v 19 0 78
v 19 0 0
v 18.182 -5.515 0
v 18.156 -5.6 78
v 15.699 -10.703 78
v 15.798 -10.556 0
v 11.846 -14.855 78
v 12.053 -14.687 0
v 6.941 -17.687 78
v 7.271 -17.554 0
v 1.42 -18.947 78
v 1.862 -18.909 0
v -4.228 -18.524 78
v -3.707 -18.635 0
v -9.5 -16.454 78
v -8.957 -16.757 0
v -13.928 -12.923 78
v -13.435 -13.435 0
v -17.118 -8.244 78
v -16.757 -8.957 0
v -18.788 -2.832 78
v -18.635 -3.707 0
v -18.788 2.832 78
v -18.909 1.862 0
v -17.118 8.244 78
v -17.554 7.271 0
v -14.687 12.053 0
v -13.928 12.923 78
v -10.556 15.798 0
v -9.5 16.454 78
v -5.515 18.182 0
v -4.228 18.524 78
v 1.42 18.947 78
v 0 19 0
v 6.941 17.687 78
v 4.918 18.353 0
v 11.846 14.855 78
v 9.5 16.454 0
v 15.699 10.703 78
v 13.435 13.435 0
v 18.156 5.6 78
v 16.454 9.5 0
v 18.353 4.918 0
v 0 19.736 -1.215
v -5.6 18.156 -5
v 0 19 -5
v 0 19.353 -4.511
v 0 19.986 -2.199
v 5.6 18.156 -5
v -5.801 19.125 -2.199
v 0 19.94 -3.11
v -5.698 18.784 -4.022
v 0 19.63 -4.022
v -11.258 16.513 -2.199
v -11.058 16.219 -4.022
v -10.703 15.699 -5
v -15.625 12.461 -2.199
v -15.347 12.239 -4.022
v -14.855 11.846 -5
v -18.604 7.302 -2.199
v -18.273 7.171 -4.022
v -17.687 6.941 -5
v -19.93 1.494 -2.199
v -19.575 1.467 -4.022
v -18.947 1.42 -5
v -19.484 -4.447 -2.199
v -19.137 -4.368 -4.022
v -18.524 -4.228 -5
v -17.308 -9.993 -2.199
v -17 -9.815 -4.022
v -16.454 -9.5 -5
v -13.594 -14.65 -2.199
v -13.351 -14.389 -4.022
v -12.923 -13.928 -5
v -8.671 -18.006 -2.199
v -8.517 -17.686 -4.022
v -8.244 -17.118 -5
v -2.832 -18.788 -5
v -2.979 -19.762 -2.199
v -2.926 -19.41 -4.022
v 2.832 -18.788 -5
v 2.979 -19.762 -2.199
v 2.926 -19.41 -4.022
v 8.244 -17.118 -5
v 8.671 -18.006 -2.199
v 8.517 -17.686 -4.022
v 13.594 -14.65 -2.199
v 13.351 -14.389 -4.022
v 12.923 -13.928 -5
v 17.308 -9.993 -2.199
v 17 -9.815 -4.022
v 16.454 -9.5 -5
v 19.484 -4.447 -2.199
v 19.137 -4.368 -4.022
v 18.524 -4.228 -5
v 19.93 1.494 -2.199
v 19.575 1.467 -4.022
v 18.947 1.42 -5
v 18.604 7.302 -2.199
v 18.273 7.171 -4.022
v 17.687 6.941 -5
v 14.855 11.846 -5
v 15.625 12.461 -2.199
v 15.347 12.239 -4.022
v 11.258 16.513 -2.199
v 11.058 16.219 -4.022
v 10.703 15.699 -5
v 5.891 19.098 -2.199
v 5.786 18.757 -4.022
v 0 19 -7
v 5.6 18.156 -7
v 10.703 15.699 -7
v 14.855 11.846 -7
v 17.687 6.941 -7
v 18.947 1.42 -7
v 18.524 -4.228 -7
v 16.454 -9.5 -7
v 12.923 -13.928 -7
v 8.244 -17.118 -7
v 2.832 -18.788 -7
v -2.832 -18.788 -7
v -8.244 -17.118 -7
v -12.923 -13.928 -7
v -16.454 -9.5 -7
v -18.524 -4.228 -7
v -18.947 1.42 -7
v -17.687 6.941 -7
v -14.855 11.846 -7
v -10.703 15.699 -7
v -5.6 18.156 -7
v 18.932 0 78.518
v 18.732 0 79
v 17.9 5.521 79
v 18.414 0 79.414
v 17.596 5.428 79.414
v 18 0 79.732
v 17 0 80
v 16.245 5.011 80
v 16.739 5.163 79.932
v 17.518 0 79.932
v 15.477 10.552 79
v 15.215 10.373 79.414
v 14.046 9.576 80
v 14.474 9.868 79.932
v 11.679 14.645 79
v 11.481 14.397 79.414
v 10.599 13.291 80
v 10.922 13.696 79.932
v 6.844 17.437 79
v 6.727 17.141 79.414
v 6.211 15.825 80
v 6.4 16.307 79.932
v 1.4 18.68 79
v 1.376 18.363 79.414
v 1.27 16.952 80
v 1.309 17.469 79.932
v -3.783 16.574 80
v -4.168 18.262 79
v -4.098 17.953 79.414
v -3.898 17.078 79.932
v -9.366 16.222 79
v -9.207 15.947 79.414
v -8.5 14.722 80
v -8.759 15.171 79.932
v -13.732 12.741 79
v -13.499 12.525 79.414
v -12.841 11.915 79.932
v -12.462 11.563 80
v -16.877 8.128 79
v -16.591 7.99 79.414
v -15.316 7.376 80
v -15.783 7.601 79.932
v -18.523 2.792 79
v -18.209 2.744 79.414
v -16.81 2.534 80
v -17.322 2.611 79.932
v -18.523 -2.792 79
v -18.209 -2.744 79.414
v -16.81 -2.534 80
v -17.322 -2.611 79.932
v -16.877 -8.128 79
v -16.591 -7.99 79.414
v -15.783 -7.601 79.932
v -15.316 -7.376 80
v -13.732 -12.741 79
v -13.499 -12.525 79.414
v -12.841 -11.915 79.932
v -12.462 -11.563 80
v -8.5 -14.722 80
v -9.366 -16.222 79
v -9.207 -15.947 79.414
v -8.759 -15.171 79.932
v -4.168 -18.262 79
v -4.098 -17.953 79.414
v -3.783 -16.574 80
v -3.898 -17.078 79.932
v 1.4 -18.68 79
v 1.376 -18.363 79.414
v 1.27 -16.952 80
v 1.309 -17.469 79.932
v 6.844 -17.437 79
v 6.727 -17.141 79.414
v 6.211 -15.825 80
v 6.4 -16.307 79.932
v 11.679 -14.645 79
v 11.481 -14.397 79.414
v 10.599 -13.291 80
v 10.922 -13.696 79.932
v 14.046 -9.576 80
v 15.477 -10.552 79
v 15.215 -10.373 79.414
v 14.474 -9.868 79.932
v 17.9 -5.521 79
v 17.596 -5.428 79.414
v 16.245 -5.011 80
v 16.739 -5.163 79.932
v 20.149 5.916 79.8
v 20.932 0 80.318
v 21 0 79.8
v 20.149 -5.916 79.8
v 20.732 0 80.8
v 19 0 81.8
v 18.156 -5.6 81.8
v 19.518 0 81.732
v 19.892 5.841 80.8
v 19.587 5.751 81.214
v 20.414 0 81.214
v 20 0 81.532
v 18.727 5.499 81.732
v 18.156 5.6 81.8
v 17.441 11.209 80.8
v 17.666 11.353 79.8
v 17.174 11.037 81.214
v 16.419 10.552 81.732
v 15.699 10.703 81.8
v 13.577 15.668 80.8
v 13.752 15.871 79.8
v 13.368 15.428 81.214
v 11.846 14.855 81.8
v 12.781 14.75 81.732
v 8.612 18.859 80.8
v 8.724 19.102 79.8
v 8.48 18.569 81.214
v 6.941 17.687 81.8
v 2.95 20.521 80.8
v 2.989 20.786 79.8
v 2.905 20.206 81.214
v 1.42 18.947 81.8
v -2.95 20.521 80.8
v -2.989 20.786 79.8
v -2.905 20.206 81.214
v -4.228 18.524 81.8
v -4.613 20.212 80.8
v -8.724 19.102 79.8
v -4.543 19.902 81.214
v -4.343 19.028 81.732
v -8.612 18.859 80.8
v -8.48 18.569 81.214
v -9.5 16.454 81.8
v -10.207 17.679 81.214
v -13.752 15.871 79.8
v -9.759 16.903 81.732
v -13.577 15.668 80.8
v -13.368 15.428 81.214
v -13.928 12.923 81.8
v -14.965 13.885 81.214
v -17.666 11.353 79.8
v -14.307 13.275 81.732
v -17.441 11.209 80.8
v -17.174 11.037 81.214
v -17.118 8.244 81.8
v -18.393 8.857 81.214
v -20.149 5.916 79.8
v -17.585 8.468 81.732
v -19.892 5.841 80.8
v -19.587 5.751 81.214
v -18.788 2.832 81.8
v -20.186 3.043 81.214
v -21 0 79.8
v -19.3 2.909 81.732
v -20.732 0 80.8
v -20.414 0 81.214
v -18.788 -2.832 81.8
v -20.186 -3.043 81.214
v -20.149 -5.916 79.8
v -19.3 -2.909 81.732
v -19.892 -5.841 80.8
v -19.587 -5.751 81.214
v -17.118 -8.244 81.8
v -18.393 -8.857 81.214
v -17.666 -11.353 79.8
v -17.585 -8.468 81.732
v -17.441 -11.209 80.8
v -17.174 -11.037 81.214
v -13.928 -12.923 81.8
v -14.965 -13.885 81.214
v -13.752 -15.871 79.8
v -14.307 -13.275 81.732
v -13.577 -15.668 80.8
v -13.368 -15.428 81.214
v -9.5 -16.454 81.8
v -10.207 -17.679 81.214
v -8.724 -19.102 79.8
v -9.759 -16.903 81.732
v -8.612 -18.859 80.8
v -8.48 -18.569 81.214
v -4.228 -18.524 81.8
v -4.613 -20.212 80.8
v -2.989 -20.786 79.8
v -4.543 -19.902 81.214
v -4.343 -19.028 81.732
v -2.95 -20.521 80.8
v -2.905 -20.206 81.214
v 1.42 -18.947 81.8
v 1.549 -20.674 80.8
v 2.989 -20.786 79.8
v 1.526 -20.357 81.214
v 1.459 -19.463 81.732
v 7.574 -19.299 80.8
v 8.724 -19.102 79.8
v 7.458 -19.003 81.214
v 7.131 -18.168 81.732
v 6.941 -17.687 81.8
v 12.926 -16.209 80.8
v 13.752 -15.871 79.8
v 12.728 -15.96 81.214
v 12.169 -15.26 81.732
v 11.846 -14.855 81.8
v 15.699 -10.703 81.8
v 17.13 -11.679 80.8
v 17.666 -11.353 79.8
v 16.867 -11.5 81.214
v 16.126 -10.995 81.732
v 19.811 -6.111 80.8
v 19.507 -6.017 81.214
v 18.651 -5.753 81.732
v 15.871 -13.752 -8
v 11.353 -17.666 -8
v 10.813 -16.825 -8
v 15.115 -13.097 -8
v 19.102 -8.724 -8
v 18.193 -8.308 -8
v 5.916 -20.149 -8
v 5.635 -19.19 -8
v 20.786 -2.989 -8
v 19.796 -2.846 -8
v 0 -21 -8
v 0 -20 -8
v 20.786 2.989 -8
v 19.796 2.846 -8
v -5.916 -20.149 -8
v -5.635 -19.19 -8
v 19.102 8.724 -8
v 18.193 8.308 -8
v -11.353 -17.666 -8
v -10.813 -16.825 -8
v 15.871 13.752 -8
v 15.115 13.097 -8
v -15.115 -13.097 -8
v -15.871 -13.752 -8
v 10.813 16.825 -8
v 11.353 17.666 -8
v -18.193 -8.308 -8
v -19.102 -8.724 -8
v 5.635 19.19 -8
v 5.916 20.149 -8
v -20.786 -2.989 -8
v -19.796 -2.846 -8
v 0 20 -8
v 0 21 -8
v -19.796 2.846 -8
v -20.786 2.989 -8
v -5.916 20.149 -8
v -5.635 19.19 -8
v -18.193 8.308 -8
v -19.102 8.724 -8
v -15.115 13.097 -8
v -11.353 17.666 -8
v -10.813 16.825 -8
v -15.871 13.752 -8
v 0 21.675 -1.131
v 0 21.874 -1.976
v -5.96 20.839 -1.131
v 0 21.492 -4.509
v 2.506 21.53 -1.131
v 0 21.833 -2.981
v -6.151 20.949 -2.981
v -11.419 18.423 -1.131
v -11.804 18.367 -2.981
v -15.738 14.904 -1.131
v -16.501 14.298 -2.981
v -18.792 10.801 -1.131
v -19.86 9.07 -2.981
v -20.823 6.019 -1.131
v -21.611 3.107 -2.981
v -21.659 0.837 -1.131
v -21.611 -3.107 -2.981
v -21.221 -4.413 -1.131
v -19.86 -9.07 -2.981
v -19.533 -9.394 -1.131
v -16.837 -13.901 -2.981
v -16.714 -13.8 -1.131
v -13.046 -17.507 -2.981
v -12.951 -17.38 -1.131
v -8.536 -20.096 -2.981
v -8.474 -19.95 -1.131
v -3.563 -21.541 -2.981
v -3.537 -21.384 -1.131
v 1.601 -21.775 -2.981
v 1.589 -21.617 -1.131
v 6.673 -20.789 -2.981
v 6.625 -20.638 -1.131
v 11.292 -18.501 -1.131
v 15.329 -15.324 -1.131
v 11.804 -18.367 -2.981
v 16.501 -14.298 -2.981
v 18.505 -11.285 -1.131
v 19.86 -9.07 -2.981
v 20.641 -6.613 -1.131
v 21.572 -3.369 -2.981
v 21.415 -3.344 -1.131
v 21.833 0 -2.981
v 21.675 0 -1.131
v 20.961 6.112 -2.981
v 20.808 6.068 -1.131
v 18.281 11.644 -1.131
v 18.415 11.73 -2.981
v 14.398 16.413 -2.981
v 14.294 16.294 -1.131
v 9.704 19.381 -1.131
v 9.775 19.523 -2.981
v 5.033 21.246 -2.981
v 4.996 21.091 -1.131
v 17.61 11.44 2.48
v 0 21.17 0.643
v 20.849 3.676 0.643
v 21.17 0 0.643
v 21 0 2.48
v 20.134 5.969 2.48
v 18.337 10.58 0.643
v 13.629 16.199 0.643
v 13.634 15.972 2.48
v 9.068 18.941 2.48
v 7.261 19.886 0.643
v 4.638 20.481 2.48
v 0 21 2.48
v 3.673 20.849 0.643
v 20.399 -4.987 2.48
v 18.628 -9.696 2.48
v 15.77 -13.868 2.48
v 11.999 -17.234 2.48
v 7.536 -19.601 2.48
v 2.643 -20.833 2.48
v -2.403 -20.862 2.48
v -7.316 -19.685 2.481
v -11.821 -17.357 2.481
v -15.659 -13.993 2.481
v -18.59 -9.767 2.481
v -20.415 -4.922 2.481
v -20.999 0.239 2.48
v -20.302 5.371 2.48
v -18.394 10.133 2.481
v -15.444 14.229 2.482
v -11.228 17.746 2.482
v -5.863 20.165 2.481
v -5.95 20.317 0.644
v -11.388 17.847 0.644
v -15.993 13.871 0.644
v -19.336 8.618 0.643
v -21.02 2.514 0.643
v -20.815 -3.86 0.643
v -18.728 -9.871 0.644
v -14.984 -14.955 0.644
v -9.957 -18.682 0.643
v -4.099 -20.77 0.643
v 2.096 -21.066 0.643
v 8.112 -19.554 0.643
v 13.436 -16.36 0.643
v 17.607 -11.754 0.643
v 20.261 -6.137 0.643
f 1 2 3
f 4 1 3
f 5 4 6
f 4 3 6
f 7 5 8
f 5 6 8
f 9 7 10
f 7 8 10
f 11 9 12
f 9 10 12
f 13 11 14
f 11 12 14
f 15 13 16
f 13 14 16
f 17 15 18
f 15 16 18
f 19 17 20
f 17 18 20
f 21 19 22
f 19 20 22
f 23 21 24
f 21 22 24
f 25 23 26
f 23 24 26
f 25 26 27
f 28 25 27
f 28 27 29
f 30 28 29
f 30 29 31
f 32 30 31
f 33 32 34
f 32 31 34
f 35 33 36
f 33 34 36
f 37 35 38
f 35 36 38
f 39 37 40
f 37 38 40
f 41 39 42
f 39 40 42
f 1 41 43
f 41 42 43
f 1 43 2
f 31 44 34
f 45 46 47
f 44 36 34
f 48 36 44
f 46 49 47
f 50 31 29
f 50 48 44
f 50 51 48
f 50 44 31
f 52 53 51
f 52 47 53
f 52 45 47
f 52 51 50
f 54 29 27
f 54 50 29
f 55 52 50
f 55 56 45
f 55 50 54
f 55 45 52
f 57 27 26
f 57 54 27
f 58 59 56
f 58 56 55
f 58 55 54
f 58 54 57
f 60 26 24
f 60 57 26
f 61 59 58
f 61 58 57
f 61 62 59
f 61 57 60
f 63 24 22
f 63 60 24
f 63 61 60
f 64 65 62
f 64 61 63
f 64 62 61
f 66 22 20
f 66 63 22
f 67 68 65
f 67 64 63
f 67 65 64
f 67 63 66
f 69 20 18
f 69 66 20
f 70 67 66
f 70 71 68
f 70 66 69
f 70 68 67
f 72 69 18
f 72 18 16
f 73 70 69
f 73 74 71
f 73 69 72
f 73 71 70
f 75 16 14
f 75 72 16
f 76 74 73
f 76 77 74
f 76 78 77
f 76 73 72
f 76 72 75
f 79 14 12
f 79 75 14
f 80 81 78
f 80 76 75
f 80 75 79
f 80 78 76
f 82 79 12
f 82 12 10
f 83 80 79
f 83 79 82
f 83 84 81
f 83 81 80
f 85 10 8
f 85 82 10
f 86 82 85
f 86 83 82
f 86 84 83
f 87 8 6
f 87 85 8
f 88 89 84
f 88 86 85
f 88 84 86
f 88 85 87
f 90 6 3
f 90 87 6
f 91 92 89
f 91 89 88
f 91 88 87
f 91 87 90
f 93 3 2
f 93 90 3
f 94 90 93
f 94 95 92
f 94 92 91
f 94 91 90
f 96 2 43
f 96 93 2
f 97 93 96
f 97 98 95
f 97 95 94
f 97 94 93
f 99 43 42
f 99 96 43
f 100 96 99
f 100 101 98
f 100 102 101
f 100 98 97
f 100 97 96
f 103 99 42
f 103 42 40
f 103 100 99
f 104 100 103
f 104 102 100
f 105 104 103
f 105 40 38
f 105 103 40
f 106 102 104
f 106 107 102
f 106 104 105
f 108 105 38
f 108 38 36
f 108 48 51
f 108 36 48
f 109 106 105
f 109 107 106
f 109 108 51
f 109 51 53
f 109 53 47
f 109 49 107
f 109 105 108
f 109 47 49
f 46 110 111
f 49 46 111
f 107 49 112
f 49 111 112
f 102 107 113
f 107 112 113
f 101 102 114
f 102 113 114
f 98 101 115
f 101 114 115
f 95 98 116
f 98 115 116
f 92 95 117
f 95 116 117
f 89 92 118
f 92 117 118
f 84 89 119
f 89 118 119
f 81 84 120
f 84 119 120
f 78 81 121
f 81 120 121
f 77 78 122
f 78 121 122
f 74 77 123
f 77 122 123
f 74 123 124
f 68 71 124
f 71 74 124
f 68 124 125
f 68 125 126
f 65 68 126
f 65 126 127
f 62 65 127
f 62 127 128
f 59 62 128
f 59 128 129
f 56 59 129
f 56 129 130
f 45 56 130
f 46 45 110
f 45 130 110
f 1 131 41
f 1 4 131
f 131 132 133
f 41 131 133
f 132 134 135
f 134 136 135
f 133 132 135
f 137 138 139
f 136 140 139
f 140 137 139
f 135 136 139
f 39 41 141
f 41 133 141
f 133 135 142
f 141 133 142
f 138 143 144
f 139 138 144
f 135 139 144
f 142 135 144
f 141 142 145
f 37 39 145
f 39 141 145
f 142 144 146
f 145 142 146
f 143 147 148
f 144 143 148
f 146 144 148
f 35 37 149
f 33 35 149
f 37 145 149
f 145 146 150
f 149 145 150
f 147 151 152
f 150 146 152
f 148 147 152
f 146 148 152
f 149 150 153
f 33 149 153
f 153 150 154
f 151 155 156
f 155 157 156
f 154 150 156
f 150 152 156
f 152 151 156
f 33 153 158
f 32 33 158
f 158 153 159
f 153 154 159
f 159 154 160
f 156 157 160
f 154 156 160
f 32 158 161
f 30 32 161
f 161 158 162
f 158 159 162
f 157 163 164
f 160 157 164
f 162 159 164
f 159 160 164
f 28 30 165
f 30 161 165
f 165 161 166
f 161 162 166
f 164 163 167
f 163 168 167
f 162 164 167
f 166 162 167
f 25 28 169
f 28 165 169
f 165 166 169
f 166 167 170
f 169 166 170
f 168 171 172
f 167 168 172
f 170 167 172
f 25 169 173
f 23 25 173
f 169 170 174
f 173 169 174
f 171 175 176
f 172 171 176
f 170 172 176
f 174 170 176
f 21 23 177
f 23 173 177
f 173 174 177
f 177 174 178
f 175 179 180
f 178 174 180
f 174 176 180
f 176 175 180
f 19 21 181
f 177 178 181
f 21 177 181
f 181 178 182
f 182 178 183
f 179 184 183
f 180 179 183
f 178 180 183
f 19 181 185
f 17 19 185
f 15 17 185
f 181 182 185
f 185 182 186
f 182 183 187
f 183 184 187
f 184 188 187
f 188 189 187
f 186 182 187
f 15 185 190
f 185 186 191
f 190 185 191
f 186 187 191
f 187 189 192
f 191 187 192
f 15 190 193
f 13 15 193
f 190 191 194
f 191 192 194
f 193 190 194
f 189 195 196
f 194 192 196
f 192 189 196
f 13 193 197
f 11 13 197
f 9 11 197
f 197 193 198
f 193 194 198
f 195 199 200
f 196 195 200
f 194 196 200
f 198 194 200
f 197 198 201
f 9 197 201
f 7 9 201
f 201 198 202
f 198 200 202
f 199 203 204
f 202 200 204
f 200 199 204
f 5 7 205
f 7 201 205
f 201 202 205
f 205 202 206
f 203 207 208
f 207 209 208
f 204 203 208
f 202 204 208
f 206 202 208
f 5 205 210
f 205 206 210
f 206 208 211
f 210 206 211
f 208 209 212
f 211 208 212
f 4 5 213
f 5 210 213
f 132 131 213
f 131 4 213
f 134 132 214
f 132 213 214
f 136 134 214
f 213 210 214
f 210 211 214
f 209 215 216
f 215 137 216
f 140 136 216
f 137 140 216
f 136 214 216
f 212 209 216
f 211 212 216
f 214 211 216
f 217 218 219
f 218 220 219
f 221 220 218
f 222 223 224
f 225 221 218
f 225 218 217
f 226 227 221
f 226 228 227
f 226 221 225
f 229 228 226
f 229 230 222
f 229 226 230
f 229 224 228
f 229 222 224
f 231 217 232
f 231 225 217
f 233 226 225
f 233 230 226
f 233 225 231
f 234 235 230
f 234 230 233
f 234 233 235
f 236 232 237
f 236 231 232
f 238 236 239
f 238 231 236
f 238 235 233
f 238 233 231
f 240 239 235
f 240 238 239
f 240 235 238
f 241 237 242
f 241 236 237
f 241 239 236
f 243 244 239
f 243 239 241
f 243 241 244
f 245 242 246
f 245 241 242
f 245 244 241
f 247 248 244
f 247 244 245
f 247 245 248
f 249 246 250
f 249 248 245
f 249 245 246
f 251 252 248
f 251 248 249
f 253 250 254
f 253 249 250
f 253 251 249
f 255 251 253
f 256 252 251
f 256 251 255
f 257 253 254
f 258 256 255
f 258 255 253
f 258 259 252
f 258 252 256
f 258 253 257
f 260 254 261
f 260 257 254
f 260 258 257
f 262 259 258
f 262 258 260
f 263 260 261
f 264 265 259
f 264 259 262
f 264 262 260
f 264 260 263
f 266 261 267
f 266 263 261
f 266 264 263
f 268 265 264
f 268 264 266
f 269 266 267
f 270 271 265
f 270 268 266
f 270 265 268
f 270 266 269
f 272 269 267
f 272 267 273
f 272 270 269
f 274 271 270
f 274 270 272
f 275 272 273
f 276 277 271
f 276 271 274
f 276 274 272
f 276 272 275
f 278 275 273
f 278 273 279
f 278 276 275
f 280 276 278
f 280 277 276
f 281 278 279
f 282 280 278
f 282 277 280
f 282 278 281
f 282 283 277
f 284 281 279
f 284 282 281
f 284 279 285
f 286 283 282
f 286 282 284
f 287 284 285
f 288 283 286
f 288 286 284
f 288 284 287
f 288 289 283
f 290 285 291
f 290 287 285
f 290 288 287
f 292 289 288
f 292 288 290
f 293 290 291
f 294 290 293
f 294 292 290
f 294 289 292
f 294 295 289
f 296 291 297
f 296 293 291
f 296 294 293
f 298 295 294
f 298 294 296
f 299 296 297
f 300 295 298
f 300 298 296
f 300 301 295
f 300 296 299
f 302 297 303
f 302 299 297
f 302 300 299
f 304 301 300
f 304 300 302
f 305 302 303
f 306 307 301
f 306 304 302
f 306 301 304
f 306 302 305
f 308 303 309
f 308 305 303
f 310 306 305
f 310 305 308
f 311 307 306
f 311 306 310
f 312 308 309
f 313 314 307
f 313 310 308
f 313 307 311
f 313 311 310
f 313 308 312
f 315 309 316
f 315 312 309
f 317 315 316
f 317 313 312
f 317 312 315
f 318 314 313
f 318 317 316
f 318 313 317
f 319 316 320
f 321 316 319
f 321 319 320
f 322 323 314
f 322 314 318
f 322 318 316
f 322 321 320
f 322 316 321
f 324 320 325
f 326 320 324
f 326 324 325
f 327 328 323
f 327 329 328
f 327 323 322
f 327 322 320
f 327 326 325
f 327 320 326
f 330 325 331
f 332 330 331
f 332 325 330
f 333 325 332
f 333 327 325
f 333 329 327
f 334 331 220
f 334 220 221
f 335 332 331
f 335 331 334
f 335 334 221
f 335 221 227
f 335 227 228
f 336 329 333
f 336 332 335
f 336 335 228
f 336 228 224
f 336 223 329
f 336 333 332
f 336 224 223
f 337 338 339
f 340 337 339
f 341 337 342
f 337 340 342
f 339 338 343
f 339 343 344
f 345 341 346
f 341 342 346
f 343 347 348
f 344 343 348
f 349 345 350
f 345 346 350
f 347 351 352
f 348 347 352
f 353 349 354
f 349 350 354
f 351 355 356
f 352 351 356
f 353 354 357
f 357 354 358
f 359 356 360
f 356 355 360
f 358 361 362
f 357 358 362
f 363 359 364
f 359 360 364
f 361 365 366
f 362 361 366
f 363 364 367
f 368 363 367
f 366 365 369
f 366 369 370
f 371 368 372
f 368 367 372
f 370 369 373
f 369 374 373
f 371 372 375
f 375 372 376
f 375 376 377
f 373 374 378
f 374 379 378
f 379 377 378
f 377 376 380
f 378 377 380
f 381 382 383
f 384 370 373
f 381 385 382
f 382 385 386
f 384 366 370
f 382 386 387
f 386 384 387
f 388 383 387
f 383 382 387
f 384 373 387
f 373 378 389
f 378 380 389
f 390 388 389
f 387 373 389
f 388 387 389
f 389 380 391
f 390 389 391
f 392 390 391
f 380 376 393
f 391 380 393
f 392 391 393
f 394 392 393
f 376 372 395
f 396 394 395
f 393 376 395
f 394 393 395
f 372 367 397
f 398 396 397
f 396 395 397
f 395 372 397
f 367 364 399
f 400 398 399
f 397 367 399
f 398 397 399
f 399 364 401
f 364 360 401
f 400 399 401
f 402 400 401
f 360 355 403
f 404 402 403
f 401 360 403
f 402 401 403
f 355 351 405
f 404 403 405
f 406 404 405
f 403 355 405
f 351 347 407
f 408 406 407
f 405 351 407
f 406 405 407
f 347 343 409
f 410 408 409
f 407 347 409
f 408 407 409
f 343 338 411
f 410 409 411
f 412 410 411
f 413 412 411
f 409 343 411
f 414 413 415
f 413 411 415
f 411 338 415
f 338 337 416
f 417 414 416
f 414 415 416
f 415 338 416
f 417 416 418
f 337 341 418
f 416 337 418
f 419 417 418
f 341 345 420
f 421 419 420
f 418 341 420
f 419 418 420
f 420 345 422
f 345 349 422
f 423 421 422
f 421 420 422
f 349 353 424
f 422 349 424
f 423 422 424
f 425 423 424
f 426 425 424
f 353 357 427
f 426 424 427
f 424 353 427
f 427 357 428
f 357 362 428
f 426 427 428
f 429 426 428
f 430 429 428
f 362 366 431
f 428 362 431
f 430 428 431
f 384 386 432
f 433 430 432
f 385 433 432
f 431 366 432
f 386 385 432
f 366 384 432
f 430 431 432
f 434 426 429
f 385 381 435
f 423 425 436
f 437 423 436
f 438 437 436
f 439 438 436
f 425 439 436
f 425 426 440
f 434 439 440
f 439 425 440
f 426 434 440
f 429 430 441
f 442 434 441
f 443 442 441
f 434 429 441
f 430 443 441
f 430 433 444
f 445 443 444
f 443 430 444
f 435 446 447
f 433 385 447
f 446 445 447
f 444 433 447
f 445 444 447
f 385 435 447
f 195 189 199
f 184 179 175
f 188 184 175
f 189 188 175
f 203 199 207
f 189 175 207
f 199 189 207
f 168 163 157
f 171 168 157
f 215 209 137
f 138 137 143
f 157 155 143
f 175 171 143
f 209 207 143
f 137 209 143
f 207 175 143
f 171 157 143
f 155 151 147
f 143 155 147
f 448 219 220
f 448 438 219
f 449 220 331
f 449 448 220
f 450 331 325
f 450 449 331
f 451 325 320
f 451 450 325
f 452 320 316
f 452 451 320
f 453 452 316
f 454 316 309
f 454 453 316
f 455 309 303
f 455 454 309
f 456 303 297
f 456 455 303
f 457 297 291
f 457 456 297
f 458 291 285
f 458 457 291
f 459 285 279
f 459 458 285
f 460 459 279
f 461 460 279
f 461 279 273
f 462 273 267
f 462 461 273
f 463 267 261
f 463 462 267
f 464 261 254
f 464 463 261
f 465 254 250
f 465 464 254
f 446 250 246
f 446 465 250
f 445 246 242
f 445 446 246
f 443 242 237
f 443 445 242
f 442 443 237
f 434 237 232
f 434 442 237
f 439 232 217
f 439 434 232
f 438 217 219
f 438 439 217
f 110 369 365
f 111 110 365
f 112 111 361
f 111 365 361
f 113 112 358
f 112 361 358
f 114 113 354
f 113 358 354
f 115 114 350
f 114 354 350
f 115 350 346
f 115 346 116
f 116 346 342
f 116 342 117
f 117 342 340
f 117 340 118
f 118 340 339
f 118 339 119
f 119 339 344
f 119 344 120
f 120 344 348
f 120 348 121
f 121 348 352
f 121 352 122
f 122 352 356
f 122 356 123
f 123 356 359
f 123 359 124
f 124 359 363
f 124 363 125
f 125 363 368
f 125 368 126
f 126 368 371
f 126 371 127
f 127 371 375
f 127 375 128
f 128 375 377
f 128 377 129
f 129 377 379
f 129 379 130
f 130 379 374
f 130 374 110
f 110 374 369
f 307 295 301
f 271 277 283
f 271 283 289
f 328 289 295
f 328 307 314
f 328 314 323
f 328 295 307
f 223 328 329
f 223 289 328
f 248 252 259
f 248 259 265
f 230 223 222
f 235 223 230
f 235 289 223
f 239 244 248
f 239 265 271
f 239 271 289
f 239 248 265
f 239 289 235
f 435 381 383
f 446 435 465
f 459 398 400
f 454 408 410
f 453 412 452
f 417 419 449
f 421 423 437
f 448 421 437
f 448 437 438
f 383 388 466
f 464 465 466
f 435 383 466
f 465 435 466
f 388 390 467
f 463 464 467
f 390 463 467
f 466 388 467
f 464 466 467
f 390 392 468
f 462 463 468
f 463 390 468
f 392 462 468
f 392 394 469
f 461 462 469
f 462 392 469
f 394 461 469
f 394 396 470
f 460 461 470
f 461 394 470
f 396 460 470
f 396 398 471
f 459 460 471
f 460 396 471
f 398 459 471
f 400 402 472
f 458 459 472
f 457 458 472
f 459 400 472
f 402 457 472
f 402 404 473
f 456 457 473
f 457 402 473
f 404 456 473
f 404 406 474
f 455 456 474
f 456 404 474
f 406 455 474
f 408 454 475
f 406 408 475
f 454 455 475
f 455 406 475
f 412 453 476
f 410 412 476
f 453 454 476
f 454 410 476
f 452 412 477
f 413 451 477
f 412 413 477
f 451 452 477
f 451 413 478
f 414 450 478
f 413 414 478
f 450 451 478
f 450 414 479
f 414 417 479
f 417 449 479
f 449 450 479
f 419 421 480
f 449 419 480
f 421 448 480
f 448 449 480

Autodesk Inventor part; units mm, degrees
ref_plane "YZ Plane" through (0, 0, 0) normal (1, 0, 0) x (0, 1, 0)
ref_plane "XZ Plane" through (0, 0, 0) normal (0, 1, 0) x (-1, 0, 0)
ref_plane "XY Plane" through (0, 0, 0) normal (0, 0, 1) x (1, 0, 0)
sketch "Skizze1" plane through (0, 0, 0) normal (0, 0, 1) x (1, 0, 0)
  circle A0 centre (0, 0) radius 19
  circle A1 centre (0, 0) radius 21
  dimension "d0" = 38
  dimension "d1" = 2
extrude "Extrusion1" add sketch "Skizze1" along normal blind 80
sketch "Skizze2" plane through (0, 0, 80) normal (0, 0, 1) x (1, 0, 0)
  circle A0 centre (0, 0) radius 21 projected
extrude "Extrusion2" add sketch "Skizze2" along normal blind 1.8
fillet "Rundung1" radius 2 2 edges at (-21, 0, 81.8) (-19, 0, 80)
sketch "Skizze3" plane through (0, 0, 0) normal (1, 0, 0) x (0, 1, 0)
  line L0 (-21, 0) -> (21, 0) projected
  line L1 (21, 0) -> (23, -2.5) construction
  line L2 (23, -2.5) -> (21, -4) construction
  line L3 (21, -4) -> (21, -8) construction
  spline S0 degree 3 poles (21, 0) (23, -2.5) (21, -4) (21, -8) knots 1 1 1 1 2 2 2 2
  spline S1 degree 2 poles (19, 0) (21, -2.5) (19, -5) knots 0 0 0 1 1 1
  line L4 (19, -5) -> (19, -8)
  line L5 (19, -8) -> (21, -8)
  line L6 (21, 0) -> (19, 0)
  line L7 (21, 0) -> (21, 79.8) projected
  line L8 (21, 0) -> (21, 79.8) projected
  line L9 (0, -25.6969) -> (0, 97.3828) projected
  point P0 (0, 0)
  point P1 (20, -2.5)
  dimension "d7" = 2
  dimension "d8" = 2
  dimension "d9" = 8
  dimension "d10" = 1
  dimension "d11" = 2.5
  dimension "d12" = 5
  dimension "d13" = 4
revolve "Umdrehung1" add sketch "Skizze3" angle 360 about axis through (0, 0, -10) along (0, 0, 1)
fillet "Rundung2" radius 10 1 edges at (14.8492, 14.8492, 0)
chamfer "Fase1" distance 1 angle 45 1 edges at (0, -19, -8)
equation "\"d11\" = 0.5 * d12"
equation "\"G_L\" = 0"
equation "\"G_H\" = 0"
equation "\"G_B\" = 0"
properties part number "Löffelbox_oben" material "GEDA Stahl"
